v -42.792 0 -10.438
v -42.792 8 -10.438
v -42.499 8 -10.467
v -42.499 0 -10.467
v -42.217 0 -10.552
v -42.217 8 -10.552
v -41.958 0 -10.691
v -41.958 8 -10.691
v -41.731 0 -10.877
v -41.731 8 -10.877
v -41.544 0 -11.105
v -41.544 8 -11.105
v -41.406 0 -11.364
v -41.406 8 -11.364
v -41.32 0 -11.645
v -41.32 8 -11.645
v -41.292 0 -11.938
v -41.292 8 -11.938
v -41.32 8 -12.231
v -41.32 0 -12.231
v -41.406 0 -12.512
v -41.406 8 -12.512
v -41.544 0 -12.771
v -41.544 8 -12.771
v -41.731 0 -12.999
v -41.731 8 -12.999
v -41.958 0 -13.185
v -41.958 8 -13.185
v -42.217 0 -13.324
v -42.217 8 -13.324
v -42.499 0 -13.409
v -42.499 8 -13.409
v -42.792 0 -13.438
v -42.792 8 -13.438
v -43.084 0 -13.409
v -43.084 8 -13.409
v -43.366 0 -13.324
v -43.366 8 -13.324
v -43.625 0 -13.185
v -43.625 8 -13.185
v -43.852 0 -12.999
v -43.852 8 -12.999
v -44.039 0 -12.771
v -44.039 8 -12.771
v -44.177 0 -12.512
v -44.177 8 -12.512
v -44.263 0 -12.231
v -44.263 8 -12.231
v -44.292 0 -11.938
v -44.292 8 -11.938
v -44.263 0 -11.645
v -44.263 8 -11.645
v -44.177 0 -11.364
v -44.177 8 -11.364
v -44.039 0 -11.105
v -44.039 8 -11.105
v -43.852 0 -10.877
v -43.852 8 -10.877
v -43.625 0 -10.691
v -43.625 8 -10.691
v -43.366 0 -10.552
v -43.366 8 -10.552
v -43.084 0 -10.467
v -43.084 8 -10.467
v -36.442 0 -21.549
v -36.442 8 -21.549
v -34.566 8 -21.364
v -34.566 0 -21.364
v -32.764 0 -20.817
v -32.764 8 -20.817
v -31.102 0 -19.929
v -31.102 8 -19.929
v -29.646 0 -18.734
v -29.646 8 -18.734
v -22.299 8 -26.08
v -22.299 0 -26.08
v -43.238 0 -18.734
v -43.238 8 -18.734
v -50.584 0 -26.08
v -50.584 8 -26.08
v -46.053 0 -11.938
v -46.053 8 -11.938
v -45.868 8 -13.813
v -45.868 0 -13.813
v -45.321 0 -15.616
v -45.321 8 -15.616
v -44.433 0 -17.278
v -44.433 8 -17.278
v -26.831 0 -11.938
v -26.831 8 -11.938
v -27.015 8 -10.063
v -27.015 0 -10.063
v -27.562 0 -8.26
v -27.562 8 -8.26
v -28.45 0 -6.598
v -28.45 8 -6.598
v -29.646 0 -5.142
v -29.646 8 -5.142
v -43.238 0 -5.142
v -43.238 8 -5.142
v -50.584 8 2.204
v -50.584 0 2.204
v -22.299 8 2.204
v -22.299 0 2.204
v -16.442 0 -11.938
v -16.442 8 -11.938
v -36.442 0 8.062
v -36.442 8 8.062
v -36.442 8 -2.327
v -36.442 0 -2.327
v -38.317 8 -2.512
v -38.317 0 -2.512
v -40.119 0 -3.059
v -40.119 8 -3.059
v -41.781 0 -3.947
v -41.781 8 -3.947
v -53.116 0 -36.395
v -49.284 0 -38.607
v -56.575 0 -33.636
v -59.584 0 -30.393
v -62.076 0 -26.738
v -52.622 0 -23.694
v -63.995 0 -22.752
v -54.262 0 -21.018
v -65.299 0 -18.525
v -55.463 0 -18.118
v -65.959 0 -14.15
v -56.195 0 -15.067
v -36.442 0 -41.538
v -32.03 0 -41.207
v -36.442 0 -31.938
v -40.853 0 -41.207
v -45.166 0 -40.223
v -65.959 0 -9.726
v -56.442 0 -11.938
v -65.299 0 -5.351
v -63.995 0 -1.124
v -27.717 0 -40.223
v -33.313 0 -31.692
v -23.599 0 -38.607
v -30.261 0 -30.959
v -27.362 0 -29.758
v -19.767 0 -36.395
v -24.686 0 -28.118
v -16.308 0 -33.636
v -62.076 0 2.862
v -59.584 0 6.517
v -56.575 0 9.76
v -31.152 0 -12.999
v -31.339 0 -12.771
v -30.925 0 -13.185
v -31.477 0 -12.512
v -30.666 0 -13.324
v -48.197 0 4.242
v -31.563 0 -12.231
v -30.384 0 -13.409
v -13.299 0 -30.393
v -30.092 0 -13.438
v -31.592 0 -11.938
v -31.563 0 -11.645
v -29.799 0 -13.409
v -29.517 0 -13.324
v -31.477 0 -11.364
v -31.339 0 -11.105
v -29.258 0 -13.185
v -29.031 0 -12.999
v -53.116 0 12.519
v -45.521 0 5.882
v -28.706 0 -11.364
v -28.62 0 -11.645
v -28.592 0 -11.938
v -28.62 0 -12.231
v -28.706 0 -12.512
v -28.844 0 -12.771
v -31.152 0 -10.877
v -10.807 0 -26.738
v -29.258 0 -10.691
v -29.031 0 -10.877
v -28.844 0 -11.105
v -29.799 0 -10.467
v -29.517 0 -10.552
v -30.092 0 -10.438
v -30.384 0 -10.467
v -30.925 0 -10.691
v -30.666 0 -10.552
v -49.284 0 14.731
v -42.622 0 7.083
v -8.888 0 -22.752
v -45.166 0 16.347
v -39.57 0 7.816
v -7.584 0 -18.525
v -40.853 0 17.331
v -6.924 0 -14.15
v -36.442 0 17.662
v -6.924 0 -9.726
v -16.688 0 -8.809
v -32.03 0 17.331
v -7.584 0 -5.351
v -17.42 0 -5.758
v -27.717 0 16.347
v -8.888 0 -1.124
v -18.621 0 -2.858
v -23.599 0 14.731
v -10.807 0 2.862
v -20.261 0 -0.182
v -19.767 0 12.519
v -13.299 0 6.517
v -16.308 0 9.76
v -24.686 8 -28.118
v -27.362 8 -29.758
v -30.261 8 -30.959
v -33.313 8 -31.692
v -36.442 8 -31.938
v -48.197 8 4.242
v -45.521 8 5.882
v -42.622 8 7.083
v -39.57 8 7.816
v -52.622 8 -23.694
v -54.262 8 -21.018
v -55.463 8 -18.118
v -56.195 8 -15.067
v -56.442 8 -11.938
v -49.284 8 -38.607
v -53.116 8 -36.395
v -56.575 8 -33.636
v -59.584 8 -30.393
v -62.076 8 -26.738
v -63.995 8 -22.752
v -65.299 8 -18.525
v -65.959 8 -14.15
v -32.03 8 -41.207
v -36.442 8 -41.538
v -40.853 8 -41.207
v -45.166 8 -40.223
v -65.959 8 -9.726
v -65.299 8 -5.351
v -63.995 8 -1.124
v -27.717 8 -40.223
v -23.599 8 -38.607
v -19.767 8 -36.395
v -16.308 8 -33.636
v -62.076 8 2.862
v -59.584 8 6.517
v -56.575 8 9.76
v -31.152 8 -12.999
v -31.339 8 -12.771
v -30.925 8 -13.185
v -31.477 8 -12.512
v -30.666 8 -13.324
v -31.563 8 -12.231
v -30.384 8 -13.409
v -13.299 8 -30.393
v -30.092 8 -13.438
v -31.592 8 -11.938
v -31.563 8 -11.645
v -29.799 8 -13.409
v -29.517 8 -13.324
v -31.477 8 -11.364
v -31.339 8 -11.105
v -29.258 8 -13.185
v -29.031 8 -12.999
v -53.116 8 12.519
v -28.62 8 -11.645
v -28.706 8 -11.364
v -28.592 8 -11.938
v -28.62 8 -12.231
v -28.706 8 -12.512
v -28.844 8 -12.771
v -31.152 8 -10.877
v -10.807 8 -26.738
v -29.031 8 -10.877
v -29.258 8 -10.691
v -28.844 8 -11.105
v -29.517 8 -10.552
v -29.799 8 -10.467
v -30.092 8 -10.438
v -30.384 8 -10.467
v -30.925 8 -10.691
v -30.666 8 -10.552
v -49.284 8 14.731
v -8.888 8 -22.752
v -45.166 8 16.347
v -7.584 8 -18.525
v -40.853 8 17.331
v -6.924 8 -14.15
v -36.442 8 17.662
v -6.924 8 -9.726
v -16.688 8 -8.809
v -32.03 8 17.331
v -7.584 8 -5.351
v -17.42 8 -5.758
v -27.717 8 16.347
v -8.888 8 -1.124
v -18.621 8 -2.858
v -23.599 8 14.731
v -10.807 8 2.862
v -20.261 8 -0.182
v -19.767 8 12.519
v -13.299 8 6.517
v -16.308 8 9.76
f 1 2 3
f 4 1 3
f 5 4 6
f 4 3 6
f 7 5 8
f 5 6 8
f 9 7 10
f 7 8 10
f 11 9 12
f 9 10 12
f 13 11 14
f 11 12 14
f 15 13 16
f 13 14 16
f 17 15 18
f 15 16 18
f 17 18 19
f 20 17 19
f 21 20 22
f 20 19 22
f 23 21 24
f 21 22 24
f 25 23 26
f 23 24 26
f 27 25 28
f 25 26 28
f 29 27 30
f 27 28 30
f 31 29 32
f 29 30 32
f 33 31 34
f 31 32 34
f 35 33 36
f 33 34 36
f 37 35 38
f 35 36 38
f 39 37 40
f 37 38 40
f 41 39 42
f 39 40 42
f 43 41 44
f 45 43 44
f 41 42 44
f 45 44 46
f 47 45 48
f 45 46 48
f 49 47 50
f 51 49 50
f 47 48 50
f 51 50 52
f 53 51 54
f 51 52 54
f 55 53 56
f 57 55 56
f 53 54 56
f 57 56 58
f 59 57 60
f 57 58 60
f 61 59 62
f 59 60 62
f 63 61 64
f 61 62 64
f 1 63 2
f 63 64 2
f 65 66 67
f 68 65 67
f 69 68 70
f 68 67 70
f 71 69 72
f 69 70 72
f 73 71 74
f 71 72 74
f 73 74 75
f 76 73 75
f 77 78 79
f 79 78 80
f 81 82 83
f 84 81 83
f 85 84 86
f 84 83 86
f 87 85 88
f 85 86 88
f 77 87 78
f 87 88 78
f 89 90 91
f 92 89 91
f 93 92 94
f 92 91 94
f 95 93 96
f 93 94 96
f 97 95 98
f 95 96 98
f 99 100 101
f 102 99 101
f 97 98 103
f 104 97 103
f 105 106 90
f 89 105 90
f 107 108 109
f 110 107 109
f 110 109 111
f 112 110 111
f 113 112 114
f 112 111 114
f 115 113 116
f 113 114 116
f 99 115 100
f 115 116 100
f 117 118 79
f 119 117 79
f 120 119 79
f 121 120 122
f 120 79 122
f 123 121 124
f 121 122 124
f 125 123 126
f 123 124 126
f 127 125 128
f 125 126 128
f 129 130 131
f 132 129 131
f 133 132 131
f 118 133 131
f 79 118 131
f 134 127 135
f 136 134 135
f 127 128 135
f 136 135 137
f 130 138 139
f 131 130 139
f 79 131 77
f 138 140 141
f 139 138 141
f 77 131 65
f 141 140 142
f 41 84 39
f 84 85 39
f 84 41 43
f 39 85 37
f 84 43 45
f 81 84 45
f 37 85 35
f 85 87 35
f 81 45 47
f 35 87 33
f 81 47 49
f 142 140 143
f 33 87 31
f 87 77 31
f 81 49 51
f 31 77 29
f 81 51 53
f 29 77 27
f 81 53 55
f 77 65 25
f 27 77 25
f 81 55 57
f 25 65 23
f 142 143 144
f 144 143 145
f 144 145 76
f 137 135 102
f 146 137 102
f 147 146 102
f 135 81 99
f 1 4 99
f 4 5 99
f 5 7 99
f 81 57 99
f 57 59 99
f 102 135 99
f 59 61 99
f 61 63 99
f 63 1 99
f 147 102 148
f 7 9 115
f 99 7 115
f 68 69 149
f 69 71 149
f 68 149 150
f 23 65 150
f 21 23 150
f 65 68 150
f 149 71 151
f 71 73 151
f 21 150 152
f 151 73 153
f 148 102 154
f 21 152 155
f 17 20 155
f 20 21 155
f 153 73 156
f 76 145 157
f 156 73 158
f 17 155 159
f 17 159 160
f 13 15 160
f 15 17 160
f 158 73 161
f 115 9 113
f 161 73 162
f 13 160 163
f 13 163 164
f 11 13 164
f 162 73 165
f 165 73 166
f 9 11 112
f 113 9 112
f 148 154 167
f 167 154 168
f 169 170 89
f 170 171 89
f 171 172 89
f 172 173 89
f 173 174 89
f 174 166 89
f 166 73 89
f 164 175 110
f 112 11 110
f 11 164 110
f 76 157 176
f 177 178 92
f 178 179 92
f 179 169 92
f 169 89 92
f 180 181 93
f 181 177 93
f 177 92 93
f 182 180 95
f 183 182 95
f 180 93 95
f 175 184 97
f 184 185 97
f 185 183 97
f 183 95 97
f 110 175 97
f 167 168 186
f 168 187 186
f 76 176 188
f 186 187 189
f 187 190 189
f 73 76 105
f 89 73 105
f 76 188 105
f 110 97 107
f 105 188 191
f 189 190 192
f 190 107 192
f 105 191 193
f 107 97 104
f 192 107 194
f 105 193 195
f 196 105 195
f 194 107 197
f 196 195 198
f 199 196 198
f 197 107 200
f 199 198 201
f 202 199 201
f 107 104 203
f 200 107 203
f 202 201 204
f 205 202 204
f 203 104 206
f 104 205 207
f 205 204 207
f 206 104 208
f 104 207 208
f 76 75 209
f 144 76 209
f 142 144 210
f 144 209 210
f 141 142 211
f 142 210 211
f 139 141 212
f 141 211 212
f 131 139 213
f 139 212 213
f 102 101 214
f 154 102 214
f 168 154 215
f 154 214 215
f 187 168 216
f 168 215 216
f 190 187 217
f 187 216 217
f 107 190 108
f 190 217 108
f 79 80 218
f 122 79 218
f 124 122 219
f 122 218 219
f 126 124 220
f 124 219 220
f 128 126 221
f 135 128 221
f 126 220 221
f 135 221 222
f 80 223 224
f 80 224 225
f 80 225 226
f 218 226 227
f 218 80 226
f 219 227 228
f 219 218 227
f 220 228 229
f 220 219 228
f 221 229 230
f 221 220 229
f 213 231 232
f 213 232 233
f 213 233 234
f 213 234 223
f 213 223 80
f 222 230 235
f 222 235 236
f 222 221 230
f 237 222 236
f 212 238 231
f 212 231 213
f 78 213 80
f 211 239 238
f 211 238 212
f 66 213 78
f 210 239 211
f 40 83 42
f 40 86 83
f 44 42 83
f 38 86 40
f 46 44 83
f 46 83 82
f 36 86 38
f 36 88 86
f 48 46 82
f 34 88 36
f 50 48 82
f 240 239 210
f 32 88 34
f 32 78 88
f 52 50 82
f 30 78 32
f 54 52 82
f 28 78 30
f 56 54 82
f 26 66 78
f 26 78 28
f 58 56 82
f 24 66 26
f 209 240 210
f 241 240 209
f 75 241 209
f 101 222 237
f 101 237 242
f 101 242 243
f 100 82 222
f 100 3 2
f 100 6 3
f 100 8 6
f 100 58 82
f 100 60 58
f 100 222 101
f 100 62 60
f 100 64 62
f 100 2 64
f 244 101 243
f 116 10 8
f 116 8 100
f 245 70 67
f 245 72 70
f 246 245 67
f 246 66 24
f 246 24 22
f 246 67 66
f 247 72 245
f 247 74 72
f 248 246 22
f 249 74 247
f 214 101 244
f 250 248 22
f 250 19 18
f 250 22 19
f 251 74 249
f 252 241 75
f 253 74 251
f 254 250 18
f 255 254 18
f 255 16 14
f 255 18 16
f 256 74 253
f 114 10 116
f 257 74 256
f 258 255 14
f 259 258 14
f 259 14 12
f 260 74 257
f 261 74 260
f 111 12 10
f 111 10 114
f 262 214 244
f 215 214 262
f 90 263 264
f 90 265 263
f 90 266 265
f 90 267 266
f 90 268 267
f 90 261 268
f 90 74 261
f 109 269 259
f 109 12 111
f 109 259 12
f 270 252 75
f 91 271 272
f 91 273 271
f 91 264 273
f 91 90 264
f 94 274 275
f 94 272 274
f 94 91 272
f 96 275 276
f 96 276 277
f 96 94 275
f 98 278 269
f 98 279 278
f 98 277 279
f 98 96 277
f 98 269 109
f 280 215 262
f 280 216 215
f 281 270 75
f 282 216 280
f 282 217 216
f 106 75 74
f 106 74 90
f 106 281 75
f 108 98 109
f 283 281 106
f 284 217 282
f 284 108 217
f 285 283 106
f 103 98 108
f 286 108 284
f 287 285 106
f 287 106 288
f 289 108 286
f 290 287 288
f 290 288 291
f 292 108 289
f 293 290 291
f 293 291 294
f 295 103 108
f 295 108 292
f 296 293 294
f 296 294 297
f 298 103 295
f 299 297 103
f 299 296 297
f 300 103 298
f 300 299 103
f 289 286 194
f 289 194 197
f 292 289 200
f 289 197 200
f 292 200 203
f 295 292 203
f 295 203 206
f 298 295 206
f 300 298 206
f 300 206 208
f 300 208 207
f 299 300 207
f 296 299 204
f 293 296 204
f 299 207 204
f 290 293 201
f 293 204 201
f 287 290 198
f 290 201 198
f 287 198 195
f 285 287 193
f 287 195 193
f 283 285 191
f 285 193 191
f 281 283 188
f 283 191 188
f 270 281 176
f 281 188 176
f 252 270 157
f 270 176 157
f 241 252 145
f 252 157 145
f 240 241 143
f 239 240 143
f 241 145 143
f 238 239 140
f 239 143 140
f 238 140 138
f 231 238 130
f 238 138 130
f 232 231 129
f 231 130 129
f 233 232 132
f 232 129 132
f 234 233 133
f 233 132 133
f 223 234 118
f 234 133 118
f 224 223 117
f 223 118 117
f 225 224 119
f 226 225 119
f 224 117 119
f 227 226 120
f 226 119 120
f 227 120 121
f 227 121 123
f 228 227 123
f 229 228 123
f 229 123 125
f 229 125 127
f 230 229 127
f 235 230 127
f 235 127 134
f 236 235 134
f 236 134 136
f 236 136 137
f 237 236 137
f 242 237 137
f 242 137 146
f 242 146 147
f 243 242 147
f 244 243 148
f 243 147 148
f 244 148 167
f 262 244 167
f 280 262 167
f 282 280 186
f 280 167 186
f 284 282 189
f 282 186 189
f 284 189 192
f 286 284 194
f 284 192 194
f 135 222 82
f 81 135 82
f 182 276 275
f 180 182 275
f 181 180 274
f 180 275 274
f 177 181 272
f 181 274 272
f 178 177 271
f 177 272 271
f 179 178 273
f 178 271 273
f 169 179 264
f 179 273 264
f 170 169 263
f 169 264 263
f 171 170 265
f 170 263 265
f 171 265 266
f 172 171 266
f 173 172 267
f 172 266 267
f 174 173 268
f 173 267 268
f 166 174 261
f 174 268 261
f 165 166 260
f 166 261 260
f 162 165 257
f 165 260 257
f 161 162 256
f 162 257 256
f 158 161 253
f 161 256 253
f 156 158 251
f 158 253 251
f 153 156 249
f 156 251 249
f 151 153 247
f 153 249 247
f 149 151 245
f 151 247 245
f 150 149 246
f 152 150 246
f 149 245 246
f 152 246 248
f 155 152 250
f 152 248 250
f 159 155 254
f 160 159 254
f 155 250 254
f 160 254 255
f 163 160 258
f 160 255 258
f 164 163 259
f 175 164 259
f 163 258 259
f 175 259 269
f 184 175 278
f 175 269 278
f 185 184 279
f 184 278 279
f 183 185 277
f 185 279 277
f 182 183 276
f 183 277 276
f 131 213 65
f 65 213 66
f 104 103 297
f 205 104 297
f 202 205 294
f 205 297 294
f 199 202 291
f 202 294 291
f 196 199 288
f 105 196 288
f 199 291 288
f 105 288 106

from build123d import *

# Parameters (mm, degrees)
ESBO_O1_R                = 29.6
RESSALTO_EXTRUS_O1_DEPTH = 8
CORTE_EXTRUS_O2_DEPTH    = 8
ESBO_O4_R                = 1.5
CORTE_EXTRUS_O4_DEPTH    = 8


with BuildPart() as part:
    # Esboço1 → Ressalto-extrusão1 (new body)
    with BuildSketch(Plane(origin=(0, 0, 0), x_dir=(1, 0, 0), z_dir=(0, 1, 0))):
        with Locations(Location((-36.441507633, 11.937959287, 0), (0, 0, 270))):
            Circle(ESBO_O1_R)
    extrude(amount=RESSALTO_EXTRUS_O1_DEPTH)

    # Esboço2 → Corte-extrusão2 (cut)
    with BuildSketch(Plane(origin=(0, 8, 0), x_dir=(1, 0, 0), z_dir=(0, 1, 0))):
        with BuildLine():
            ThreePointArc((-46.052507633, 11.937959287), (-45.32091382, 15.615929755), (-43.237510907, 18.733962561))
            Line((-43.237510907, 18.733962561), (-50.583643257, 26.080094911))
            ThreePointArc((-50.583643257, 26.080094911), (-54.919098283, 19.591627934), (-56.441507633, 11.937959287))
            Line((-56.441507633, 11.937959287), (-46.052507633, 11.937959287))
        make_face()
        with BuildLine():
            ThreePointArc((-36.441507633, 21.548959287), (-32.763537165, 20.817365474), (-29.645504359, 18.733962561))
            Line((-29.645504359, 18.733962561), (-22.299372009, 26.080094911))
            ThreePointArc((-22.299372009, 26.080094911), (-28.787838986, 30.415549937), (-36.441507633, 31.937959287))
            Line((-36.441507633, 31.937959287), (-36.441507633, 21.548959287))
        make_face()
        with BuildLine():
            Line((-16.441507633, 11.937959287), (-26.830507633, 11.937959287))
            ThreePointArc((-26.830507633, 11.937959287), (-27.562101446, 8.259988818), (-29.645504359, 5.141956013))
            Line((-29.645504359, 5.141956013), (-22.299372009, -2.204176337))
            ThreePointArc((-22.299372009, -2.204176337), (-17.963916983, 4.28429064), (-16.441507633, 11.937959287))
        make_face()
        with BuildLine():
            Line((-36.441507633, -8.062040713), (-36.441507633, 2.326959287))
            ThreePointArc((-36.441507633, 2.326959287), (-40.119478102, 3.0585531), (-43.237510907, 5.141956013))
            Line((-43.237510907, 5.141956013), (-50.583643257, -2.204176337))
            ThreePointArc((-50.583643257, -2.204176337), (-44.09517628, -6.539631363), (-36.441507633, -8.062040713))
        make_face()
    extrude(amount=-CORTE_EXTRUS_O2_DEPTH, mode=Mode.SUBTRACT)

    # Esboço4 → Corte-extrusão4 (cut)
    with BuildSketch(Plane(origin=(0, 8, 0), x_dir=(1, 0, 0), z_dir=(0, 1, 0))):
        with Locations(Location((-30.091507633, 11.937959287, 0), (0, 0, 270))):
            Circle(ESBO_O4_R)
        with Locations(Location((-42.791507633, 11.937959287, 0), (0, 0, 270))):
            Circle(ESBO_O4_R)
    extrude(amount=-CORTE_EXTRUS_O4_DEPTH, mode=Mode.SUBTRACT)


solid = part.part
